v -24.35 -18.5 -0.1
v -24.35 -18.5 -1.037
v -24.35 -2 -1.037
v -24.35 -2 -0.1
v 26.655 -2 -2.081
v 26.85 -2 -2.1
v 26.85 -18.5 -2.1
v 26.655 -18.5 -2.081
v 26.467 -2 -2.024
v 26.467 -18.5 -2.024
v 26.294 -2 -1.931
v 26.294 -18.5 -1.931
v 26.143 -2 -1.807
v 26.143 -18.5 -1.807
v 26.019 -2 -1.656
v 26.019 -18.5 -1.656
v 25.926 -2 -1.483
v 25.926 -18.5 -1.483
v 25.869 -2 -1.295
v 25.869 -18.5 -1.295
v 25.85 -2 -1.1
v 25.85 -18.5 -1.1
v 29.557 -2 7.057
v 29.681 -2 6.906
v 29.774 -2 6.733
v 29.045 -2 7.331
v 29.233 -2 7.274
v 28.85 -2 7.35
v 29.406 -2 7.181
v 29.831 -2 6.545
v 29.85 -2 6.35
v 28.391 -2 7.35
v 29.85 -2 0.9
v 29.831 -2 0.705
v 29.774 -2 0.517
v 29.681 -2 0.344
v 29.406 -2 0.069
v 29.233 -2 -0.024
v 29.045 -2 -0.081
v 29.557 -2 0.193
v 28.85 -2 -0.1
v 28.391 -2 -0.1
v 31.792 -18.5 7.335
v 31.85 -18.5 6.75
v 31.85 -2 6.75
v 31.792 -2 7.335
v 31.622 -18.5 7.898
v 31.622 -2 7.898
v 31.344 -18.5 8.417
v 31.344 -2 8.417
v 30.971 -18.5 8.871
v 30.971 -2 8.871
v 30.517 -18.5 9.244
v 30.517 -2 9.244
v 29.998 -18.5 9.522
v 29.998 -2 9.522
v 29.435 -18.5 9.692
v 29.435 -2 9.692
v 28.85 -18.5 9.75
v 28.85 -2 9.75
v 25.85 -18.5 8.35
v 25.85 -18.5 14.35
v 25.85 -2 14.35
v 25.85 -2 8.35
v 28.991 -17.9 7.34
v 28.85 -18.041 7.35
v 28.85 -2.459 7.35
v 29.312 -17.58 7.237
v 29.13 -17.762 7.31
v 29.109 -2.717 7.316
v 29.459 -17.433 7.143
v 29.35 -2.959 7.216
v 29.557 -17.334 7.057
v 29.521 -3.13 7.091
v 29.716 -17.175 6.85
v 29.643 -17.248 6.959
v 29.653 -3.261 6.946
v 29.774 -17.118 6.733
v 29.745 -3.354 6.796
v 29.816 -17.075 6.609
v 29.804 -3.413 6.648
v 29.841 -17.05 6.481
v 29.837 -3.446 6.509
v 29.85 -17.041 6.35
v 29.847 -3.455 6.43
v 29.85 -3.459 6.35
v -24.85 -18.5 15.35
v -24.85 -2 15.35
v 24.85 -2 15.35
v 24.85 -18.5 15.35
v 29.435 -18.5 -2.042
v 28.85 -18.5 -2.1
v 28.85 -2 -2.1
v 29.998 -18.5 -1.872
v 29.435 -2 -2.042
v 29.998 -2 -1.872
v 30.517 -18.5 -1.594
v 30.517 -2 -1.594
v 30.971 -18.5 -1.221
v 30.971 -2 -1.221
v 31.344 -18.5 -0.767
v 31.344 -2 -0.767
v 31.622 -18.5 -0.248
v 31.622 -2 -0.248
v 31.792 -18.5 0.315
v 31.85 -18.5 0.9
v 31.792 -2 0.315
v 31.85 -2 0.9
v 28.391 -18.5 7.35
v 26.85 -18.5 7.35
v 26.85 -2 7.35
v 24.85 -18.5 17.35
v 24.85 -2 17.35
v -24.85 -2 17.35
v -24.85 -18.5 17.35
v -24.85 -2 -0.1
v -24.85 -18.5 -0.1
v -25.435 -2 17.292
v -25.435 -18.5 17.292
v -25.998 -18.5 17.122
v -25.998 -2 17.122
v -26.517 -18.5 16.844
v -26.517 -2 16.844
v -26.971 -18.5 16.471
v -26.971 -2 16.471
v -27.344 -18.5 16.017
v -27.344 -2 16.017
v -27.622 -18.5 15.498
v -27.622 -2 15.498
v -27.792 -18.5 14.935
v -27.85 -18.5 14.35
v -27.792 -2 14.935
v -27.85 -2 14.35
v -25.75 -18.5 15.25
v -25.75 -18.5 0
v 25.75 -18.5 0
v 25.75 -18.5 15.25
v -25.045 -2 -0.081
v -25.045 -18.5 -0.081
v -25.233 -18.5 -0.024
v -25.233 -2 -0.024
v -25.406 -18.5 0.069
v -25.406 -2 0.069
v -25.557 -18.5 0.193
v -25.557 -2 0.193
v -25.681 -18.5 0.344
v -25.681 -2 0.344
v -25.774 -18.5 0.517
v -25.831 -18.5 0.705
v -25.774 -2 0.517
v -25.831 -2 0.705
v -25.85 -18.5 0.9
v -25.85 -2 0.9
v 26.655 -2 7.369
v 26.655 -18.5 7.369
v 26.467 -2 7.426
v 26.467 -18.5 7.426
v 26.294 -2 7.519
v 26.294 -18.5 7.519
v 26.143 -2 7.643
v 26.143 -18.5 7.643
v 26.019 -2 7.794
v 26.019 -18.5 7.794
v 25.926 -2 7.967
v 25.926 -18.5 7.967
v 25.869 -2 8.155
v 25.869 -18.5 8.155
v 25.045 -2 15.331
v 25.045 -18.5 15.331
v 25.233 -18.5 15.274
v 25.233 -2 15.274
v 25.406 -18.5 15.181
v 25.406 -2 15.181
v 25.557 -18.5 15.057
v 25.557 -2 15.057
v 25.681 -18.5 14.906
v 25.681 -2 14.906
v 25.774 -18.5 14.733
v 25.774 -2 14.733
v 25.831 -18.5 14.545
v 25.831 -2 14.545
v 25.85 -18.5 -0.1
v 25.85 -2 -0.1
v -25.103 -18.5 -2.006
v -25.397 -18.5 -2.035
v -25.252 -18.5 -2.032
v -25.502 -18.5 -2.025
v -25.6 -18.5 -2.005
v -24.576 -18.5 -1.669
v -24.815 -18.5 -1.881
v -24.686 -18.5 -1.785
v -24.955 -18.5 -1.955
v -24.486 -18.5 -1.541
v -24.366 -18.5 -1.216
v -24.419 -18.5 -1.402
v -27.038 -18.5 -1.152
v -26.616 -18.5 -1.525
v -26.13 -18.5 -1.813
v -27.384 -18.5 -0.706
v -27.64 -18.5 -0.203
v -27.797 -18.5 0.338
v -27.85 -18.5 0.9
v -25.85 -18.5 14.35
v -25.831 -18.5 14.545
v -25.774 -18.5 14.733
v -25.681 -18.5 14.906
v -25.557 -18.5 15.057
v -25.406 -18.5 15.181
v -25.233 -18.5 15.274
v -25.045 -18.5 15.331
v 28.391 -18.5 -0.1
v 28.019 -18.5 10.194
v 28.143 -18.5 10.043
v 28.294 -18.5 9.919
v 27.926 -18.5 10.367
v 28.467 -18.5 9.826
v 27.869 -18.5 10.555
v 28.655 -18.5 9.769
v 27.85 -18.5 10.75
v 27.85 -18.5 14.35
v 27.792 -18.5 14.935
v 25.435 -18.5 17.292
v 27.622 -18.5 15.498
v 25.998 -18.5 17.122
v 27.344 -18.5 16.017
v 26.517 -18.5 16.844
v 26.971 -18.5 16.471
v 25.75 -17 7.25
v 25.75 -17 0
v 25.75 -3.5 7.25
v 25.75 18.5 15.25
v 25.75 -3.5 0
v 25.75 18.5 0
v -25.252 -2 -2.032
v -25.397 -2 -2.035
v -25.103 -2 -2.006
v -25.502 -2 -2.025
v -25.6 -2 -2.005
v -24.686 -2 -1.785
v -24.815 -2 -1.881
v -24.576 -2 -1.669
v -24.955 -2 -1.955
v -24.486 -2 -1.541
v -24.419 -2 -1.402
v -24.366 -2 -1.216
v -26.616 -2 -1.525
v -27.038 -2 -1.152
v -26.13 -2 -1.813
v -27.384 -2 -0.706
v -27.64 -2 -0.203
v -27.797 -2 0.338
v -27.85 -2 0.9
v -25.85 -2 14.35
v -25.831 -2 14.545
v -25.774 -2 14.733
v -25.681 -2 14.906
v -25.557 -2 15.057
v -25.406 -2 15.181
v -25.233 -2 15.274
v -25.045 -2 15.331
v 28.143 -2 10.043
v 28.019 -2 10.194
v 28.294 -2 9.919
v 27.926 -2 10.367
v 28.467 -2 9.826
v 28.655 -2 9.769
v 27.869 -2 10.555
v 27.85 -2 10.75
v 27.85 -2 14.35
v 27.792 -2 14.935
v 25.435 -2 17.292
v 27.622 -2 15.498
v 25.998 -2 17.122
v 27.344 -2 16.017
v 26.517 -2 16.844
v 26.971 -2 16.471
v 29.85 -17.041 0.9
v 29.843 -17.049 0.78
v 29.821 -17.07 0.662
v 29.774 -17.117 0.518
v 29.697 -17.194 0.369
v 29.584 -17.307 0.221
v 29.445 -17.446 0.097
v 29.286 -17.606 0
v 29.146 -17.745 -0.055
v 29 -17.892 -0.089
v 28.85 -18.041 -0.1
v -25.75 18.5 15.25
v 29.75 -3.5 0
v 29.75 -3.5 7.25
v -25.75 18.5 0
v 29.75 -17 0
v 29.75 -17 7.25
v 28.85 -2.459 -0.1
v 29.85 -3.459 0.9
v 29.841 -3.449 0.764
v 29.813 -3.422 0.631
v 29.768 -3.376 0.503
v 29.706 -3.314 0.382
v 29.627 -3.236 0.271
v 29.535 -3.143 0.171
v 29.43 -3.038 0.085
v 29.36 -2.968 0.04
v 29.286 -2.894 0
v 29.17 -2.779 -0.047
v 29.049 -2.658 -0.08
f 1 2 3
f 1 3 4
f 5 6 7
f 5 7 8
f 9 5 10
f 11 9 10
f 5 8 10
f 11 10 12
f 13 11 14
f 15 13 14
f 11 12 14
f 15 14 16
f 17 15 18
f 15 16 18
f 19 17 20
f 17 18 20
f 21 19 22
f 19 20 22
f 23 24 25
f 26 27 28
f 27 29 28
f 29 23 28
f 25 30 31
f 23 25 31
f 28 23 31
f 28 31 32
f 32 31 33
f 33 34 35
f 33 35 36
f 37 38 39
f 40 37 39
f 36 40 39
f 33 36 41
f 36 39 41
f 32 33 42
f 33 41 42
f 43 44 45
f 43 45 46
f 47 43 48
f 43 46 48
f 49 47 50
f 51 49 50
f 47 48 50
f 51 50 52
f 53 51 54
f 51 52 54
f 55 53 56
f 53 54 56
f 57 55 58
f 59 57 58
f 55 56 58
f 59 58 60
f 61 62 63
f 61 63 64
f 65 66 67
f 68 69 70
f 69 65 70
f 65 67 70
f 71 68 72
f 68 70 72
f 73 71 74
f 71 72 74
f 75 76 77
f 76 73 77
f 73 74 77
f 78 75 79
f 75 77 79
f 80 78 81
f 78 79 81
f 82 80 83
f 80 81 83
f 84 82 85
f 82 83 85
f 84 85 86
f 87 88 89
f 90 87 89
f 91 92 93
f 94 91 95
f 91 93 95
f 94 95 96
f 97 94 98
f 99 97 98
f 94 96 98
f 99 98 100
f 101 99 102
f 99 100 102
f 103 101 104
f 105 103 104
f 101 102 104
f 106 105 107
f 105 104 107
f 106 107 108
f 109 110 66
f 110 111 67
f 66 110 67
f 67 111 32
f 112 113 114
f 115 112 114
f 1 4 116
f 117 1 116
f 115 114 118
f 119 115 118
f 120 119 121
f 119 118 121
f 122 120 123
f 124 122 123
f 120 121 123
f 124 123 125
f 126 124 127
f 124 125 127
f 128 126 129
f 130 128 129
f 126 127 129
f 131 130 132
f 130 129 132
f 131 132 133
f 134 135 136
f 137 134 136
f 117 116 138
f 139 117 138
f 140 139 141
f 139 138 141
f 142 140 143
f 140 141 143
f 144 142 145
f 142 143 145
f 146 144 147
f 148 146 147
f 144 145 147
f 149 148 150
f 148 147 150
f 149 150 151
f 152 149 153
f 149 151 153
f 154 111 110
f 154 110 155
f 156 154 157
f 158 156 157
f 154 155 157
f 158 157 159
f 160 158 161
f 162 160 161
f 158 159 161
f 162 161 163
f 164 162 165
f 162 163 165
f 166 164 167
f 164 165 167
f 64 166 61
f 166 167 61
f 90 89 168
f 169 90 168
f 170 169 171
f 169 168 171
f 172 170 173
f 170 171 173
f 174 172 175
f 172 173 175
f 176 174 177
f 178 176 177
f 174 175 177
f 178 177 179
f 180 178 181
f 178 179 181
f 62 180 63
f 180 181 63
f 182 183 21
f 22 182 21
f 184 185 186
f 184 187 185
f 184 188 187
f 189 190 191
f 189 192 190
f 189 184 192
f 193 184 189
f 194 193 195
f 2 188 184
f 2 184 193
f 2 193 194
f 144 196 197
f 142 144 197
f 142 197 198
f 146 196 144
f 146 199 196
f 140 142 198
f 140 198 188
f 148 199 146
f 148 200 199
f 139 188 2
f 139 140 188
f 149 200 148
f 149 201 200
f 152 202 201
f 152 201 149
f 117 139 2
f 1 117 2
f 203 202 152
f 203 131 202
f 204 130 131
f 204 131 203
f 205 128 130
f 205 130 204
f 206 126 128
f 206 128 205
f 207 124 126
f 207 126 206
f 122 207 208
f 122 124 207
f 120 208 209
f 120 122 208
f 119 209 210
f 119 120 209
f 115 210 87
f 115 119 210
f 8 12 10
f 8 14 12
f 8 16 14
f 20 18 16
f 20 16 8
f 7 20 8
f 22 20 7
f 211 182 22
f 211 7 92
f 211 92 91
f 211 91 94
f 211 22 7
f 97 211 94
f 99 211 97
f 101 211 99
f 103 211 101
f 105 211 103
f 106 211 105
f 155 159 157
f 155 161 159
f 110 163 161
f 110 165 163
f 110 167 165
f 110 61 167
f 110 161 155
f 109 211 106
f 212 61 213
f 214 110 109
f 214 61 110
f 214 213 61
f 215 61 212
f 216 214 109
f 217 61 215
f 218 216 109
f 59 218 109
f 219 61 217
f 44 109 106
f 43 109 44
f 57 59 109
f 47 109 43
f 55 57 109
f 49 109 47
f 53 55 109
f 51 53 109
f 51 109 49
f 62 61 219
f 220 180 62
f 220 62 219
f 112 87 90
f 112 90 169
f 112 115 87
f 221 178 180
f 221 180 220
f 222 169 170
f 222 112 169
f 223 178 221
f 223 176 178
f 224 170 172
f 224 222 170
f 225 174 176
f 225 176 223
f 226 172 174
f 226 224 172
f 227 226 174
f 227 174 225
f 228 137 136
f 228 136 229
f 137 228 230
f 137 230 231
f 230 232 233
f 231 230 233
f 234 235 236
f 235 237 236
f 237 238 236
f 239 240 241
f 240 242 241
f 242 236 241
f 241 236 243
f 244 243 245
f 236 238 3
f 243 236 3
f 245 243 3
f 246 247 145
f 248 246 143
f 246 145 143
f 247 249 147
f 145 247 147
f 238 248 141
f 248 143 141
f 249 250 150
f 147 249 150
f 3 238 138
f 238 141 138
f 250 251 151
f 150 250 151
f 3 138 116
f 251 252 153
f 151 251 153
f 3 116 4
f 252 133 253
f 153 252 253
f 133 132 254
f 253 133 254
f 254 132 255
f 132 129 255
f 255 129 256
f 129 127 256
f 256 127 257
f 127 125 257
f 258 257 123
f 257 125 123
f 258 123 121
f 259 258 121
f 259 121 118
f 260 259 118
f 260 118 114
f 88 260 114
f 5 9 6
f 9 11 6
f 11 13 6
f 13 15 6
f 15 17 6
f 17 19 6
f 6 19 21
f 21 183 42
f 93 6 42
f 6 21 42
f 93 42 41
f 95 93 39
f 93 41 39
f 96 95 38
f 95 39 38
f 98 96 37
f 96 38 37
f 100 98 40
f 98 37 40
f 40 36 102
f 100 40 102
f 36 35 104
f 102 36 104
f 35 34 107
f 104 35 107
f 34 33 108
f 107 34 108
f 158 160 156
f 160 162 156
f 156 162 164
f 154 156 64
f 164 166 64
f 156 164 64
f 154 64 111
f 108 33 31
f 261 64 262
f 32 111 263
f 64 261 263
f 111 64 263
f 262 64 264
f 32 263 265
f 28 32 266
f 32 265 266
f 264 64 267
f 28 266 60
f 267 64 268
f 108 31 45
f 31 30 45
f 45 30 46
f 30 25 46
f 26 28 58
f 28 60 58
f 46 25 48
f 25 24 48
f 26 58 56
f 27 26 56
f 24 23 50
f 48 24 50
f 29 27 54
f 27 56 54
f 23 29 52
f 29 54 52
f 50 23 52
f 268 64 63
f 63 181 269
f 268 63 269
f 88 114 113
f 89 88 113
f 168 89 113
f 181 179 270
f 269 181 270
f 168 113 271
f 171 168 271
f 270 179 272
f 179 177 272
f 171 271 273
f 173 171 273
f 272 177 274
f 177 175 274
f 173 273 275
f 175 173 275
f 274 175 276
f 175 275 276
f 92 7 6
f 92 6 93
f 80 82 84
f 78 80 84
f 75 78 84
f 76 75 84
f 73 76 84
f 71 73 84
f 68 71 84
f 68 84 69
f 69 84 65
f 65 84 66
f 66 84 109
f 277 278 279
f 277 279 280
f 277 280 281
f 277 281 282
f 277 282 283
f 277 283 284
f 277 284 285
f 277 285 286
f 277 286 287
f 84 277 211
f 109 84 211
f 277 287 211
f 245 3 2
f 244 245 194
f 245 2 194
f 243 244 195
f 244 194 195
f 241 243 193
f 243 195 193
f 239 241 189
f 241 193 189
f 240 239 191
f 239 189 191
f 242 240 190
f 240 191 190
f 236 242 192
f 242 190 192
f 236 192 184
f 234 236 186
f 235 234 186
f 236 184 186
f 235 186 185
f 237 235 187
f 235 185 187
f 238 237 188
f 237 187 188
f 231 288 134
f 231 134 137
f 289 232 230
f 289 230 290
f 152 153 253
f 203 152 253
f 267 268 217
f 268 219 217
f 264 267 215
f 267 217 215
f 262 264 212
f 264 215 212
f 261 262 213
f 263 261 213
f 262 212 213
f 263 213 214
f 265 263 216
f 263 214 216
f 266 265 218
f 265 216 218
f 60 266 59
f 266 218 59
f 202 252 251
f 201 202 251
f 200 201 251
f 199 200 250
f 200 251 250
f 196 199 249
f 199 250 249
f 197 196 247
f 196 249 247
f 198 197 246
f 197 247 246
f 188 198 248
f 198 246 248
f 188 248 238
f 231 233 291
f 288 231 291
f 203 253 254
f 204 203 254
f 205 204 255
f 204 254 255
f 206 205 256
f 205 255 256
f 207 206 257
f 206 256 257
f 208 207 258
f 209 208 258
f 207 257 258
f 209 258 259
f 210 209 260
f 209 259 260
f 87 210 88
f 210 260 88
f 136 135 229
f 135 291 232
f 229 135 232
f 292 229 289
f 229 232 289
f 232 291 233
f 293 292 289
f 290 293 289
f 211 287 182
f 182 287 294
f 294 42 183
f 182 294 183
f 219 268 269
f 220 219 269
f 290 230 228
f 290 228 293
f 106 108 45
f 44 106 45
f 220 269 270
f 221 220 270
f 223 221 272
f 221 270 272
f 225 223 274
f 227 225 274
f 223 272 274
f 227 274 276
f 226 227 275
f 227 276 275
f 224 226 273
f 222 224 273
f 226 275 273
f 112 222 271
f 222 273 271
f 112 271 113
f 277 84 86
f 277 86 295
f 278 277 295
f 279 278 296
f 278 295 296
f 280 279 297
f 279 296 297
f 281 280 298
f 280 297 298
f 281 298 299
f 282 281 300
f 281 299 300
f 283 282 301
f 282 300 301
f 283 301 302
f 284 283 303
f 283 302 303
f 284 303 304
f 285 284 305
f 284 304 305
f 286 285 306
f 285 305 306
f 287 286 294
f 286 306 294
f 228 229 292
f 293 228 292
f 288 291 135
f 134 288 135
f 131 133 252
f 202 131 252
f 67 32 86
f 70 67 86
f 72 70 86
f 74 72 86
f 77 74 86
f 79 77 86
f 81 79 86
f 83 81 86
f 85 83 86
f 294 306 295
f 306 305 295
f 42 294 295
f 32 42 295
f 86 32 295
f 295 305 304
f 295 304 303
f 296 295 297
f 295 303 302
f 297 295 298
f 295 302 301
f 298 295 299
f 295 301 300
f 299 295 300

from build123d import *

# Parameters (mm, degrees)
F0_W          = 4
F0_H          = 13.5
F1_DEPTH      = 7.25
F2_DEPTH      = 15.25
F4_START      = 2
F4_DEPTH      = 16.5
F6_DEPTH      = 0.1
F6_DEPTH_BACK = 7.35
F7_R          = 0.99999


# Not quite as in the source:
# - a fillet or chamfer is up to 0.001 mm smaller than in the source, because OpenCascade refuses the exact size


with BuildPart() as f1:
    # F0 (on Top) → F1 (new body)
    with BuildSketch(Plane.XY):
        with Locations((27.75, -10.25)):
            Rectangle(F0_W, F0_H)
    extrude(amount=F1_DEPTH)

    # F0 (on Top) → F2 (join)
    with BuildSketch(Plane.XY):
        Polygon((25.75, 18.5), (-25.75, 18.5), (-25.75, -18.5), (25.75, -18.5), (25.75, -17), (25.75, -3.5), align=None)
    extrude(amount=F2_DEPTH)


with BuildPart() as f4:
    # F3 (on Front) → F4 (new body)
    with BuildSketch(Plane.XZ.offset(F4_START)):
        with BuildLine():
            Line((-24.85, 15.35), (24.85, 15.35))
            ThreePointArc((24.85, 15.35), (25.5571067812, 15.0571067812), (25.85, 14.35))
            Line((25.85, 14.35), (25.85, 7.35))
            Line((25.85, 7.35), (28.85, 7.35))
            ThreePointArc((28.85, 7.35), (29.5571067812, 7.0571067812), (29.85, 6.35))
            Line((29.85, 6.35), (29.85, 0.9))
            ThreePointArc((29.85, 0.9), (29.5571067812, 0.1928932188), (28.85, -0.1))
            Line((28.85, -0.1), (26, -0.1))
            Line((26, -0.1), (25.85, -0.1))
            Line((25.85, -0.1), (25.85, -2.1))
            Line((25.85, -2.1), (26, -2.1))
            Line((26, -2.1), (28.85, -2.1))
            ThreePointArc((28.85, -2.1), (30.9713203436, -1.2213203436), (31.85, 0.9))
            Line((31.85, 0.9), (31.85, 6.75))
            ThreePointArc((31.85, 6.75), (30.9713203436, 8.8713203436), (28.85, 9.75))
            Line((28.85, 9.75), (27.85, 9.75))
            Line((27.85, 9.75), (27.85, 14.35))
            ThreePointArc((27.85, 14.35), (26.9713203436, 16.4713203436), (24.85, 17.35))
            Line((24.85, 17.35), (-24.85, 17.35))
            ThreePointArc((-24.85, 17.35), (-26.9713203436, 16.4713203436), (-27.85, 14.35))
            Line((-27.85, 14.35), (-27.85, 0.9))
            ThreePointArc((-27.85, 0.9), (-26.9713203436, -1.2213203436), (-24.85, -2.1))
            Line((-24.85, -2.1), (-24.35, -2.1))
            Line((-24.35, -2.1), (-24.35, -0.1))
            Line((-24.35, -0.1), (-24.85, -0.1))
            ThreePointArc((-24.85, -0.1), (-25.5571067812, 0.1928932188), (-25.85, 0.9))
            Line((-25.85, 0.9), (-25.85, 14.35))
            ThreePointArc((-25.85, 14.35), (-25.5571067812, 15.0571067812), (-24.85, 15.35))
        make_face()
    extrude(amount=F4_DEPTH)

    # F5 (on Top) → F6 (join, two sides)
    with BuildSketch(Plane.XY) as f6_sk:
        Polygon((29.85, -3.4585786438), (29.85, -2.0000000002), (28.3914213564, -2.0000000001), align=None)
        Polygon((28.3914213559, -18.5000000004), (29.85, -18.5000000004), (29.85, -17.0414213562), align=None)
    extrude(amount=-F6_DEPTH)
    extrude(f6_sk.sketch, amount=F6_DEPTH_BACK)

    # F7 (radius 1 in the source; OpenCascade refuses exactly that, so slightly less here)
    f7_edges = [f4.edges().sort_by_distance(p)[0] for p in [
        (25.85, -10.25, 7.35),
        (27.85, -10.25, 9.75),
        (-24.35, -10.25, -2.1),
        (25.85, -10.25, -2.1),
    ]]
    fillet(f7_edges, radius=F7_R)


solid = Compound([f1.part, f4.part])
